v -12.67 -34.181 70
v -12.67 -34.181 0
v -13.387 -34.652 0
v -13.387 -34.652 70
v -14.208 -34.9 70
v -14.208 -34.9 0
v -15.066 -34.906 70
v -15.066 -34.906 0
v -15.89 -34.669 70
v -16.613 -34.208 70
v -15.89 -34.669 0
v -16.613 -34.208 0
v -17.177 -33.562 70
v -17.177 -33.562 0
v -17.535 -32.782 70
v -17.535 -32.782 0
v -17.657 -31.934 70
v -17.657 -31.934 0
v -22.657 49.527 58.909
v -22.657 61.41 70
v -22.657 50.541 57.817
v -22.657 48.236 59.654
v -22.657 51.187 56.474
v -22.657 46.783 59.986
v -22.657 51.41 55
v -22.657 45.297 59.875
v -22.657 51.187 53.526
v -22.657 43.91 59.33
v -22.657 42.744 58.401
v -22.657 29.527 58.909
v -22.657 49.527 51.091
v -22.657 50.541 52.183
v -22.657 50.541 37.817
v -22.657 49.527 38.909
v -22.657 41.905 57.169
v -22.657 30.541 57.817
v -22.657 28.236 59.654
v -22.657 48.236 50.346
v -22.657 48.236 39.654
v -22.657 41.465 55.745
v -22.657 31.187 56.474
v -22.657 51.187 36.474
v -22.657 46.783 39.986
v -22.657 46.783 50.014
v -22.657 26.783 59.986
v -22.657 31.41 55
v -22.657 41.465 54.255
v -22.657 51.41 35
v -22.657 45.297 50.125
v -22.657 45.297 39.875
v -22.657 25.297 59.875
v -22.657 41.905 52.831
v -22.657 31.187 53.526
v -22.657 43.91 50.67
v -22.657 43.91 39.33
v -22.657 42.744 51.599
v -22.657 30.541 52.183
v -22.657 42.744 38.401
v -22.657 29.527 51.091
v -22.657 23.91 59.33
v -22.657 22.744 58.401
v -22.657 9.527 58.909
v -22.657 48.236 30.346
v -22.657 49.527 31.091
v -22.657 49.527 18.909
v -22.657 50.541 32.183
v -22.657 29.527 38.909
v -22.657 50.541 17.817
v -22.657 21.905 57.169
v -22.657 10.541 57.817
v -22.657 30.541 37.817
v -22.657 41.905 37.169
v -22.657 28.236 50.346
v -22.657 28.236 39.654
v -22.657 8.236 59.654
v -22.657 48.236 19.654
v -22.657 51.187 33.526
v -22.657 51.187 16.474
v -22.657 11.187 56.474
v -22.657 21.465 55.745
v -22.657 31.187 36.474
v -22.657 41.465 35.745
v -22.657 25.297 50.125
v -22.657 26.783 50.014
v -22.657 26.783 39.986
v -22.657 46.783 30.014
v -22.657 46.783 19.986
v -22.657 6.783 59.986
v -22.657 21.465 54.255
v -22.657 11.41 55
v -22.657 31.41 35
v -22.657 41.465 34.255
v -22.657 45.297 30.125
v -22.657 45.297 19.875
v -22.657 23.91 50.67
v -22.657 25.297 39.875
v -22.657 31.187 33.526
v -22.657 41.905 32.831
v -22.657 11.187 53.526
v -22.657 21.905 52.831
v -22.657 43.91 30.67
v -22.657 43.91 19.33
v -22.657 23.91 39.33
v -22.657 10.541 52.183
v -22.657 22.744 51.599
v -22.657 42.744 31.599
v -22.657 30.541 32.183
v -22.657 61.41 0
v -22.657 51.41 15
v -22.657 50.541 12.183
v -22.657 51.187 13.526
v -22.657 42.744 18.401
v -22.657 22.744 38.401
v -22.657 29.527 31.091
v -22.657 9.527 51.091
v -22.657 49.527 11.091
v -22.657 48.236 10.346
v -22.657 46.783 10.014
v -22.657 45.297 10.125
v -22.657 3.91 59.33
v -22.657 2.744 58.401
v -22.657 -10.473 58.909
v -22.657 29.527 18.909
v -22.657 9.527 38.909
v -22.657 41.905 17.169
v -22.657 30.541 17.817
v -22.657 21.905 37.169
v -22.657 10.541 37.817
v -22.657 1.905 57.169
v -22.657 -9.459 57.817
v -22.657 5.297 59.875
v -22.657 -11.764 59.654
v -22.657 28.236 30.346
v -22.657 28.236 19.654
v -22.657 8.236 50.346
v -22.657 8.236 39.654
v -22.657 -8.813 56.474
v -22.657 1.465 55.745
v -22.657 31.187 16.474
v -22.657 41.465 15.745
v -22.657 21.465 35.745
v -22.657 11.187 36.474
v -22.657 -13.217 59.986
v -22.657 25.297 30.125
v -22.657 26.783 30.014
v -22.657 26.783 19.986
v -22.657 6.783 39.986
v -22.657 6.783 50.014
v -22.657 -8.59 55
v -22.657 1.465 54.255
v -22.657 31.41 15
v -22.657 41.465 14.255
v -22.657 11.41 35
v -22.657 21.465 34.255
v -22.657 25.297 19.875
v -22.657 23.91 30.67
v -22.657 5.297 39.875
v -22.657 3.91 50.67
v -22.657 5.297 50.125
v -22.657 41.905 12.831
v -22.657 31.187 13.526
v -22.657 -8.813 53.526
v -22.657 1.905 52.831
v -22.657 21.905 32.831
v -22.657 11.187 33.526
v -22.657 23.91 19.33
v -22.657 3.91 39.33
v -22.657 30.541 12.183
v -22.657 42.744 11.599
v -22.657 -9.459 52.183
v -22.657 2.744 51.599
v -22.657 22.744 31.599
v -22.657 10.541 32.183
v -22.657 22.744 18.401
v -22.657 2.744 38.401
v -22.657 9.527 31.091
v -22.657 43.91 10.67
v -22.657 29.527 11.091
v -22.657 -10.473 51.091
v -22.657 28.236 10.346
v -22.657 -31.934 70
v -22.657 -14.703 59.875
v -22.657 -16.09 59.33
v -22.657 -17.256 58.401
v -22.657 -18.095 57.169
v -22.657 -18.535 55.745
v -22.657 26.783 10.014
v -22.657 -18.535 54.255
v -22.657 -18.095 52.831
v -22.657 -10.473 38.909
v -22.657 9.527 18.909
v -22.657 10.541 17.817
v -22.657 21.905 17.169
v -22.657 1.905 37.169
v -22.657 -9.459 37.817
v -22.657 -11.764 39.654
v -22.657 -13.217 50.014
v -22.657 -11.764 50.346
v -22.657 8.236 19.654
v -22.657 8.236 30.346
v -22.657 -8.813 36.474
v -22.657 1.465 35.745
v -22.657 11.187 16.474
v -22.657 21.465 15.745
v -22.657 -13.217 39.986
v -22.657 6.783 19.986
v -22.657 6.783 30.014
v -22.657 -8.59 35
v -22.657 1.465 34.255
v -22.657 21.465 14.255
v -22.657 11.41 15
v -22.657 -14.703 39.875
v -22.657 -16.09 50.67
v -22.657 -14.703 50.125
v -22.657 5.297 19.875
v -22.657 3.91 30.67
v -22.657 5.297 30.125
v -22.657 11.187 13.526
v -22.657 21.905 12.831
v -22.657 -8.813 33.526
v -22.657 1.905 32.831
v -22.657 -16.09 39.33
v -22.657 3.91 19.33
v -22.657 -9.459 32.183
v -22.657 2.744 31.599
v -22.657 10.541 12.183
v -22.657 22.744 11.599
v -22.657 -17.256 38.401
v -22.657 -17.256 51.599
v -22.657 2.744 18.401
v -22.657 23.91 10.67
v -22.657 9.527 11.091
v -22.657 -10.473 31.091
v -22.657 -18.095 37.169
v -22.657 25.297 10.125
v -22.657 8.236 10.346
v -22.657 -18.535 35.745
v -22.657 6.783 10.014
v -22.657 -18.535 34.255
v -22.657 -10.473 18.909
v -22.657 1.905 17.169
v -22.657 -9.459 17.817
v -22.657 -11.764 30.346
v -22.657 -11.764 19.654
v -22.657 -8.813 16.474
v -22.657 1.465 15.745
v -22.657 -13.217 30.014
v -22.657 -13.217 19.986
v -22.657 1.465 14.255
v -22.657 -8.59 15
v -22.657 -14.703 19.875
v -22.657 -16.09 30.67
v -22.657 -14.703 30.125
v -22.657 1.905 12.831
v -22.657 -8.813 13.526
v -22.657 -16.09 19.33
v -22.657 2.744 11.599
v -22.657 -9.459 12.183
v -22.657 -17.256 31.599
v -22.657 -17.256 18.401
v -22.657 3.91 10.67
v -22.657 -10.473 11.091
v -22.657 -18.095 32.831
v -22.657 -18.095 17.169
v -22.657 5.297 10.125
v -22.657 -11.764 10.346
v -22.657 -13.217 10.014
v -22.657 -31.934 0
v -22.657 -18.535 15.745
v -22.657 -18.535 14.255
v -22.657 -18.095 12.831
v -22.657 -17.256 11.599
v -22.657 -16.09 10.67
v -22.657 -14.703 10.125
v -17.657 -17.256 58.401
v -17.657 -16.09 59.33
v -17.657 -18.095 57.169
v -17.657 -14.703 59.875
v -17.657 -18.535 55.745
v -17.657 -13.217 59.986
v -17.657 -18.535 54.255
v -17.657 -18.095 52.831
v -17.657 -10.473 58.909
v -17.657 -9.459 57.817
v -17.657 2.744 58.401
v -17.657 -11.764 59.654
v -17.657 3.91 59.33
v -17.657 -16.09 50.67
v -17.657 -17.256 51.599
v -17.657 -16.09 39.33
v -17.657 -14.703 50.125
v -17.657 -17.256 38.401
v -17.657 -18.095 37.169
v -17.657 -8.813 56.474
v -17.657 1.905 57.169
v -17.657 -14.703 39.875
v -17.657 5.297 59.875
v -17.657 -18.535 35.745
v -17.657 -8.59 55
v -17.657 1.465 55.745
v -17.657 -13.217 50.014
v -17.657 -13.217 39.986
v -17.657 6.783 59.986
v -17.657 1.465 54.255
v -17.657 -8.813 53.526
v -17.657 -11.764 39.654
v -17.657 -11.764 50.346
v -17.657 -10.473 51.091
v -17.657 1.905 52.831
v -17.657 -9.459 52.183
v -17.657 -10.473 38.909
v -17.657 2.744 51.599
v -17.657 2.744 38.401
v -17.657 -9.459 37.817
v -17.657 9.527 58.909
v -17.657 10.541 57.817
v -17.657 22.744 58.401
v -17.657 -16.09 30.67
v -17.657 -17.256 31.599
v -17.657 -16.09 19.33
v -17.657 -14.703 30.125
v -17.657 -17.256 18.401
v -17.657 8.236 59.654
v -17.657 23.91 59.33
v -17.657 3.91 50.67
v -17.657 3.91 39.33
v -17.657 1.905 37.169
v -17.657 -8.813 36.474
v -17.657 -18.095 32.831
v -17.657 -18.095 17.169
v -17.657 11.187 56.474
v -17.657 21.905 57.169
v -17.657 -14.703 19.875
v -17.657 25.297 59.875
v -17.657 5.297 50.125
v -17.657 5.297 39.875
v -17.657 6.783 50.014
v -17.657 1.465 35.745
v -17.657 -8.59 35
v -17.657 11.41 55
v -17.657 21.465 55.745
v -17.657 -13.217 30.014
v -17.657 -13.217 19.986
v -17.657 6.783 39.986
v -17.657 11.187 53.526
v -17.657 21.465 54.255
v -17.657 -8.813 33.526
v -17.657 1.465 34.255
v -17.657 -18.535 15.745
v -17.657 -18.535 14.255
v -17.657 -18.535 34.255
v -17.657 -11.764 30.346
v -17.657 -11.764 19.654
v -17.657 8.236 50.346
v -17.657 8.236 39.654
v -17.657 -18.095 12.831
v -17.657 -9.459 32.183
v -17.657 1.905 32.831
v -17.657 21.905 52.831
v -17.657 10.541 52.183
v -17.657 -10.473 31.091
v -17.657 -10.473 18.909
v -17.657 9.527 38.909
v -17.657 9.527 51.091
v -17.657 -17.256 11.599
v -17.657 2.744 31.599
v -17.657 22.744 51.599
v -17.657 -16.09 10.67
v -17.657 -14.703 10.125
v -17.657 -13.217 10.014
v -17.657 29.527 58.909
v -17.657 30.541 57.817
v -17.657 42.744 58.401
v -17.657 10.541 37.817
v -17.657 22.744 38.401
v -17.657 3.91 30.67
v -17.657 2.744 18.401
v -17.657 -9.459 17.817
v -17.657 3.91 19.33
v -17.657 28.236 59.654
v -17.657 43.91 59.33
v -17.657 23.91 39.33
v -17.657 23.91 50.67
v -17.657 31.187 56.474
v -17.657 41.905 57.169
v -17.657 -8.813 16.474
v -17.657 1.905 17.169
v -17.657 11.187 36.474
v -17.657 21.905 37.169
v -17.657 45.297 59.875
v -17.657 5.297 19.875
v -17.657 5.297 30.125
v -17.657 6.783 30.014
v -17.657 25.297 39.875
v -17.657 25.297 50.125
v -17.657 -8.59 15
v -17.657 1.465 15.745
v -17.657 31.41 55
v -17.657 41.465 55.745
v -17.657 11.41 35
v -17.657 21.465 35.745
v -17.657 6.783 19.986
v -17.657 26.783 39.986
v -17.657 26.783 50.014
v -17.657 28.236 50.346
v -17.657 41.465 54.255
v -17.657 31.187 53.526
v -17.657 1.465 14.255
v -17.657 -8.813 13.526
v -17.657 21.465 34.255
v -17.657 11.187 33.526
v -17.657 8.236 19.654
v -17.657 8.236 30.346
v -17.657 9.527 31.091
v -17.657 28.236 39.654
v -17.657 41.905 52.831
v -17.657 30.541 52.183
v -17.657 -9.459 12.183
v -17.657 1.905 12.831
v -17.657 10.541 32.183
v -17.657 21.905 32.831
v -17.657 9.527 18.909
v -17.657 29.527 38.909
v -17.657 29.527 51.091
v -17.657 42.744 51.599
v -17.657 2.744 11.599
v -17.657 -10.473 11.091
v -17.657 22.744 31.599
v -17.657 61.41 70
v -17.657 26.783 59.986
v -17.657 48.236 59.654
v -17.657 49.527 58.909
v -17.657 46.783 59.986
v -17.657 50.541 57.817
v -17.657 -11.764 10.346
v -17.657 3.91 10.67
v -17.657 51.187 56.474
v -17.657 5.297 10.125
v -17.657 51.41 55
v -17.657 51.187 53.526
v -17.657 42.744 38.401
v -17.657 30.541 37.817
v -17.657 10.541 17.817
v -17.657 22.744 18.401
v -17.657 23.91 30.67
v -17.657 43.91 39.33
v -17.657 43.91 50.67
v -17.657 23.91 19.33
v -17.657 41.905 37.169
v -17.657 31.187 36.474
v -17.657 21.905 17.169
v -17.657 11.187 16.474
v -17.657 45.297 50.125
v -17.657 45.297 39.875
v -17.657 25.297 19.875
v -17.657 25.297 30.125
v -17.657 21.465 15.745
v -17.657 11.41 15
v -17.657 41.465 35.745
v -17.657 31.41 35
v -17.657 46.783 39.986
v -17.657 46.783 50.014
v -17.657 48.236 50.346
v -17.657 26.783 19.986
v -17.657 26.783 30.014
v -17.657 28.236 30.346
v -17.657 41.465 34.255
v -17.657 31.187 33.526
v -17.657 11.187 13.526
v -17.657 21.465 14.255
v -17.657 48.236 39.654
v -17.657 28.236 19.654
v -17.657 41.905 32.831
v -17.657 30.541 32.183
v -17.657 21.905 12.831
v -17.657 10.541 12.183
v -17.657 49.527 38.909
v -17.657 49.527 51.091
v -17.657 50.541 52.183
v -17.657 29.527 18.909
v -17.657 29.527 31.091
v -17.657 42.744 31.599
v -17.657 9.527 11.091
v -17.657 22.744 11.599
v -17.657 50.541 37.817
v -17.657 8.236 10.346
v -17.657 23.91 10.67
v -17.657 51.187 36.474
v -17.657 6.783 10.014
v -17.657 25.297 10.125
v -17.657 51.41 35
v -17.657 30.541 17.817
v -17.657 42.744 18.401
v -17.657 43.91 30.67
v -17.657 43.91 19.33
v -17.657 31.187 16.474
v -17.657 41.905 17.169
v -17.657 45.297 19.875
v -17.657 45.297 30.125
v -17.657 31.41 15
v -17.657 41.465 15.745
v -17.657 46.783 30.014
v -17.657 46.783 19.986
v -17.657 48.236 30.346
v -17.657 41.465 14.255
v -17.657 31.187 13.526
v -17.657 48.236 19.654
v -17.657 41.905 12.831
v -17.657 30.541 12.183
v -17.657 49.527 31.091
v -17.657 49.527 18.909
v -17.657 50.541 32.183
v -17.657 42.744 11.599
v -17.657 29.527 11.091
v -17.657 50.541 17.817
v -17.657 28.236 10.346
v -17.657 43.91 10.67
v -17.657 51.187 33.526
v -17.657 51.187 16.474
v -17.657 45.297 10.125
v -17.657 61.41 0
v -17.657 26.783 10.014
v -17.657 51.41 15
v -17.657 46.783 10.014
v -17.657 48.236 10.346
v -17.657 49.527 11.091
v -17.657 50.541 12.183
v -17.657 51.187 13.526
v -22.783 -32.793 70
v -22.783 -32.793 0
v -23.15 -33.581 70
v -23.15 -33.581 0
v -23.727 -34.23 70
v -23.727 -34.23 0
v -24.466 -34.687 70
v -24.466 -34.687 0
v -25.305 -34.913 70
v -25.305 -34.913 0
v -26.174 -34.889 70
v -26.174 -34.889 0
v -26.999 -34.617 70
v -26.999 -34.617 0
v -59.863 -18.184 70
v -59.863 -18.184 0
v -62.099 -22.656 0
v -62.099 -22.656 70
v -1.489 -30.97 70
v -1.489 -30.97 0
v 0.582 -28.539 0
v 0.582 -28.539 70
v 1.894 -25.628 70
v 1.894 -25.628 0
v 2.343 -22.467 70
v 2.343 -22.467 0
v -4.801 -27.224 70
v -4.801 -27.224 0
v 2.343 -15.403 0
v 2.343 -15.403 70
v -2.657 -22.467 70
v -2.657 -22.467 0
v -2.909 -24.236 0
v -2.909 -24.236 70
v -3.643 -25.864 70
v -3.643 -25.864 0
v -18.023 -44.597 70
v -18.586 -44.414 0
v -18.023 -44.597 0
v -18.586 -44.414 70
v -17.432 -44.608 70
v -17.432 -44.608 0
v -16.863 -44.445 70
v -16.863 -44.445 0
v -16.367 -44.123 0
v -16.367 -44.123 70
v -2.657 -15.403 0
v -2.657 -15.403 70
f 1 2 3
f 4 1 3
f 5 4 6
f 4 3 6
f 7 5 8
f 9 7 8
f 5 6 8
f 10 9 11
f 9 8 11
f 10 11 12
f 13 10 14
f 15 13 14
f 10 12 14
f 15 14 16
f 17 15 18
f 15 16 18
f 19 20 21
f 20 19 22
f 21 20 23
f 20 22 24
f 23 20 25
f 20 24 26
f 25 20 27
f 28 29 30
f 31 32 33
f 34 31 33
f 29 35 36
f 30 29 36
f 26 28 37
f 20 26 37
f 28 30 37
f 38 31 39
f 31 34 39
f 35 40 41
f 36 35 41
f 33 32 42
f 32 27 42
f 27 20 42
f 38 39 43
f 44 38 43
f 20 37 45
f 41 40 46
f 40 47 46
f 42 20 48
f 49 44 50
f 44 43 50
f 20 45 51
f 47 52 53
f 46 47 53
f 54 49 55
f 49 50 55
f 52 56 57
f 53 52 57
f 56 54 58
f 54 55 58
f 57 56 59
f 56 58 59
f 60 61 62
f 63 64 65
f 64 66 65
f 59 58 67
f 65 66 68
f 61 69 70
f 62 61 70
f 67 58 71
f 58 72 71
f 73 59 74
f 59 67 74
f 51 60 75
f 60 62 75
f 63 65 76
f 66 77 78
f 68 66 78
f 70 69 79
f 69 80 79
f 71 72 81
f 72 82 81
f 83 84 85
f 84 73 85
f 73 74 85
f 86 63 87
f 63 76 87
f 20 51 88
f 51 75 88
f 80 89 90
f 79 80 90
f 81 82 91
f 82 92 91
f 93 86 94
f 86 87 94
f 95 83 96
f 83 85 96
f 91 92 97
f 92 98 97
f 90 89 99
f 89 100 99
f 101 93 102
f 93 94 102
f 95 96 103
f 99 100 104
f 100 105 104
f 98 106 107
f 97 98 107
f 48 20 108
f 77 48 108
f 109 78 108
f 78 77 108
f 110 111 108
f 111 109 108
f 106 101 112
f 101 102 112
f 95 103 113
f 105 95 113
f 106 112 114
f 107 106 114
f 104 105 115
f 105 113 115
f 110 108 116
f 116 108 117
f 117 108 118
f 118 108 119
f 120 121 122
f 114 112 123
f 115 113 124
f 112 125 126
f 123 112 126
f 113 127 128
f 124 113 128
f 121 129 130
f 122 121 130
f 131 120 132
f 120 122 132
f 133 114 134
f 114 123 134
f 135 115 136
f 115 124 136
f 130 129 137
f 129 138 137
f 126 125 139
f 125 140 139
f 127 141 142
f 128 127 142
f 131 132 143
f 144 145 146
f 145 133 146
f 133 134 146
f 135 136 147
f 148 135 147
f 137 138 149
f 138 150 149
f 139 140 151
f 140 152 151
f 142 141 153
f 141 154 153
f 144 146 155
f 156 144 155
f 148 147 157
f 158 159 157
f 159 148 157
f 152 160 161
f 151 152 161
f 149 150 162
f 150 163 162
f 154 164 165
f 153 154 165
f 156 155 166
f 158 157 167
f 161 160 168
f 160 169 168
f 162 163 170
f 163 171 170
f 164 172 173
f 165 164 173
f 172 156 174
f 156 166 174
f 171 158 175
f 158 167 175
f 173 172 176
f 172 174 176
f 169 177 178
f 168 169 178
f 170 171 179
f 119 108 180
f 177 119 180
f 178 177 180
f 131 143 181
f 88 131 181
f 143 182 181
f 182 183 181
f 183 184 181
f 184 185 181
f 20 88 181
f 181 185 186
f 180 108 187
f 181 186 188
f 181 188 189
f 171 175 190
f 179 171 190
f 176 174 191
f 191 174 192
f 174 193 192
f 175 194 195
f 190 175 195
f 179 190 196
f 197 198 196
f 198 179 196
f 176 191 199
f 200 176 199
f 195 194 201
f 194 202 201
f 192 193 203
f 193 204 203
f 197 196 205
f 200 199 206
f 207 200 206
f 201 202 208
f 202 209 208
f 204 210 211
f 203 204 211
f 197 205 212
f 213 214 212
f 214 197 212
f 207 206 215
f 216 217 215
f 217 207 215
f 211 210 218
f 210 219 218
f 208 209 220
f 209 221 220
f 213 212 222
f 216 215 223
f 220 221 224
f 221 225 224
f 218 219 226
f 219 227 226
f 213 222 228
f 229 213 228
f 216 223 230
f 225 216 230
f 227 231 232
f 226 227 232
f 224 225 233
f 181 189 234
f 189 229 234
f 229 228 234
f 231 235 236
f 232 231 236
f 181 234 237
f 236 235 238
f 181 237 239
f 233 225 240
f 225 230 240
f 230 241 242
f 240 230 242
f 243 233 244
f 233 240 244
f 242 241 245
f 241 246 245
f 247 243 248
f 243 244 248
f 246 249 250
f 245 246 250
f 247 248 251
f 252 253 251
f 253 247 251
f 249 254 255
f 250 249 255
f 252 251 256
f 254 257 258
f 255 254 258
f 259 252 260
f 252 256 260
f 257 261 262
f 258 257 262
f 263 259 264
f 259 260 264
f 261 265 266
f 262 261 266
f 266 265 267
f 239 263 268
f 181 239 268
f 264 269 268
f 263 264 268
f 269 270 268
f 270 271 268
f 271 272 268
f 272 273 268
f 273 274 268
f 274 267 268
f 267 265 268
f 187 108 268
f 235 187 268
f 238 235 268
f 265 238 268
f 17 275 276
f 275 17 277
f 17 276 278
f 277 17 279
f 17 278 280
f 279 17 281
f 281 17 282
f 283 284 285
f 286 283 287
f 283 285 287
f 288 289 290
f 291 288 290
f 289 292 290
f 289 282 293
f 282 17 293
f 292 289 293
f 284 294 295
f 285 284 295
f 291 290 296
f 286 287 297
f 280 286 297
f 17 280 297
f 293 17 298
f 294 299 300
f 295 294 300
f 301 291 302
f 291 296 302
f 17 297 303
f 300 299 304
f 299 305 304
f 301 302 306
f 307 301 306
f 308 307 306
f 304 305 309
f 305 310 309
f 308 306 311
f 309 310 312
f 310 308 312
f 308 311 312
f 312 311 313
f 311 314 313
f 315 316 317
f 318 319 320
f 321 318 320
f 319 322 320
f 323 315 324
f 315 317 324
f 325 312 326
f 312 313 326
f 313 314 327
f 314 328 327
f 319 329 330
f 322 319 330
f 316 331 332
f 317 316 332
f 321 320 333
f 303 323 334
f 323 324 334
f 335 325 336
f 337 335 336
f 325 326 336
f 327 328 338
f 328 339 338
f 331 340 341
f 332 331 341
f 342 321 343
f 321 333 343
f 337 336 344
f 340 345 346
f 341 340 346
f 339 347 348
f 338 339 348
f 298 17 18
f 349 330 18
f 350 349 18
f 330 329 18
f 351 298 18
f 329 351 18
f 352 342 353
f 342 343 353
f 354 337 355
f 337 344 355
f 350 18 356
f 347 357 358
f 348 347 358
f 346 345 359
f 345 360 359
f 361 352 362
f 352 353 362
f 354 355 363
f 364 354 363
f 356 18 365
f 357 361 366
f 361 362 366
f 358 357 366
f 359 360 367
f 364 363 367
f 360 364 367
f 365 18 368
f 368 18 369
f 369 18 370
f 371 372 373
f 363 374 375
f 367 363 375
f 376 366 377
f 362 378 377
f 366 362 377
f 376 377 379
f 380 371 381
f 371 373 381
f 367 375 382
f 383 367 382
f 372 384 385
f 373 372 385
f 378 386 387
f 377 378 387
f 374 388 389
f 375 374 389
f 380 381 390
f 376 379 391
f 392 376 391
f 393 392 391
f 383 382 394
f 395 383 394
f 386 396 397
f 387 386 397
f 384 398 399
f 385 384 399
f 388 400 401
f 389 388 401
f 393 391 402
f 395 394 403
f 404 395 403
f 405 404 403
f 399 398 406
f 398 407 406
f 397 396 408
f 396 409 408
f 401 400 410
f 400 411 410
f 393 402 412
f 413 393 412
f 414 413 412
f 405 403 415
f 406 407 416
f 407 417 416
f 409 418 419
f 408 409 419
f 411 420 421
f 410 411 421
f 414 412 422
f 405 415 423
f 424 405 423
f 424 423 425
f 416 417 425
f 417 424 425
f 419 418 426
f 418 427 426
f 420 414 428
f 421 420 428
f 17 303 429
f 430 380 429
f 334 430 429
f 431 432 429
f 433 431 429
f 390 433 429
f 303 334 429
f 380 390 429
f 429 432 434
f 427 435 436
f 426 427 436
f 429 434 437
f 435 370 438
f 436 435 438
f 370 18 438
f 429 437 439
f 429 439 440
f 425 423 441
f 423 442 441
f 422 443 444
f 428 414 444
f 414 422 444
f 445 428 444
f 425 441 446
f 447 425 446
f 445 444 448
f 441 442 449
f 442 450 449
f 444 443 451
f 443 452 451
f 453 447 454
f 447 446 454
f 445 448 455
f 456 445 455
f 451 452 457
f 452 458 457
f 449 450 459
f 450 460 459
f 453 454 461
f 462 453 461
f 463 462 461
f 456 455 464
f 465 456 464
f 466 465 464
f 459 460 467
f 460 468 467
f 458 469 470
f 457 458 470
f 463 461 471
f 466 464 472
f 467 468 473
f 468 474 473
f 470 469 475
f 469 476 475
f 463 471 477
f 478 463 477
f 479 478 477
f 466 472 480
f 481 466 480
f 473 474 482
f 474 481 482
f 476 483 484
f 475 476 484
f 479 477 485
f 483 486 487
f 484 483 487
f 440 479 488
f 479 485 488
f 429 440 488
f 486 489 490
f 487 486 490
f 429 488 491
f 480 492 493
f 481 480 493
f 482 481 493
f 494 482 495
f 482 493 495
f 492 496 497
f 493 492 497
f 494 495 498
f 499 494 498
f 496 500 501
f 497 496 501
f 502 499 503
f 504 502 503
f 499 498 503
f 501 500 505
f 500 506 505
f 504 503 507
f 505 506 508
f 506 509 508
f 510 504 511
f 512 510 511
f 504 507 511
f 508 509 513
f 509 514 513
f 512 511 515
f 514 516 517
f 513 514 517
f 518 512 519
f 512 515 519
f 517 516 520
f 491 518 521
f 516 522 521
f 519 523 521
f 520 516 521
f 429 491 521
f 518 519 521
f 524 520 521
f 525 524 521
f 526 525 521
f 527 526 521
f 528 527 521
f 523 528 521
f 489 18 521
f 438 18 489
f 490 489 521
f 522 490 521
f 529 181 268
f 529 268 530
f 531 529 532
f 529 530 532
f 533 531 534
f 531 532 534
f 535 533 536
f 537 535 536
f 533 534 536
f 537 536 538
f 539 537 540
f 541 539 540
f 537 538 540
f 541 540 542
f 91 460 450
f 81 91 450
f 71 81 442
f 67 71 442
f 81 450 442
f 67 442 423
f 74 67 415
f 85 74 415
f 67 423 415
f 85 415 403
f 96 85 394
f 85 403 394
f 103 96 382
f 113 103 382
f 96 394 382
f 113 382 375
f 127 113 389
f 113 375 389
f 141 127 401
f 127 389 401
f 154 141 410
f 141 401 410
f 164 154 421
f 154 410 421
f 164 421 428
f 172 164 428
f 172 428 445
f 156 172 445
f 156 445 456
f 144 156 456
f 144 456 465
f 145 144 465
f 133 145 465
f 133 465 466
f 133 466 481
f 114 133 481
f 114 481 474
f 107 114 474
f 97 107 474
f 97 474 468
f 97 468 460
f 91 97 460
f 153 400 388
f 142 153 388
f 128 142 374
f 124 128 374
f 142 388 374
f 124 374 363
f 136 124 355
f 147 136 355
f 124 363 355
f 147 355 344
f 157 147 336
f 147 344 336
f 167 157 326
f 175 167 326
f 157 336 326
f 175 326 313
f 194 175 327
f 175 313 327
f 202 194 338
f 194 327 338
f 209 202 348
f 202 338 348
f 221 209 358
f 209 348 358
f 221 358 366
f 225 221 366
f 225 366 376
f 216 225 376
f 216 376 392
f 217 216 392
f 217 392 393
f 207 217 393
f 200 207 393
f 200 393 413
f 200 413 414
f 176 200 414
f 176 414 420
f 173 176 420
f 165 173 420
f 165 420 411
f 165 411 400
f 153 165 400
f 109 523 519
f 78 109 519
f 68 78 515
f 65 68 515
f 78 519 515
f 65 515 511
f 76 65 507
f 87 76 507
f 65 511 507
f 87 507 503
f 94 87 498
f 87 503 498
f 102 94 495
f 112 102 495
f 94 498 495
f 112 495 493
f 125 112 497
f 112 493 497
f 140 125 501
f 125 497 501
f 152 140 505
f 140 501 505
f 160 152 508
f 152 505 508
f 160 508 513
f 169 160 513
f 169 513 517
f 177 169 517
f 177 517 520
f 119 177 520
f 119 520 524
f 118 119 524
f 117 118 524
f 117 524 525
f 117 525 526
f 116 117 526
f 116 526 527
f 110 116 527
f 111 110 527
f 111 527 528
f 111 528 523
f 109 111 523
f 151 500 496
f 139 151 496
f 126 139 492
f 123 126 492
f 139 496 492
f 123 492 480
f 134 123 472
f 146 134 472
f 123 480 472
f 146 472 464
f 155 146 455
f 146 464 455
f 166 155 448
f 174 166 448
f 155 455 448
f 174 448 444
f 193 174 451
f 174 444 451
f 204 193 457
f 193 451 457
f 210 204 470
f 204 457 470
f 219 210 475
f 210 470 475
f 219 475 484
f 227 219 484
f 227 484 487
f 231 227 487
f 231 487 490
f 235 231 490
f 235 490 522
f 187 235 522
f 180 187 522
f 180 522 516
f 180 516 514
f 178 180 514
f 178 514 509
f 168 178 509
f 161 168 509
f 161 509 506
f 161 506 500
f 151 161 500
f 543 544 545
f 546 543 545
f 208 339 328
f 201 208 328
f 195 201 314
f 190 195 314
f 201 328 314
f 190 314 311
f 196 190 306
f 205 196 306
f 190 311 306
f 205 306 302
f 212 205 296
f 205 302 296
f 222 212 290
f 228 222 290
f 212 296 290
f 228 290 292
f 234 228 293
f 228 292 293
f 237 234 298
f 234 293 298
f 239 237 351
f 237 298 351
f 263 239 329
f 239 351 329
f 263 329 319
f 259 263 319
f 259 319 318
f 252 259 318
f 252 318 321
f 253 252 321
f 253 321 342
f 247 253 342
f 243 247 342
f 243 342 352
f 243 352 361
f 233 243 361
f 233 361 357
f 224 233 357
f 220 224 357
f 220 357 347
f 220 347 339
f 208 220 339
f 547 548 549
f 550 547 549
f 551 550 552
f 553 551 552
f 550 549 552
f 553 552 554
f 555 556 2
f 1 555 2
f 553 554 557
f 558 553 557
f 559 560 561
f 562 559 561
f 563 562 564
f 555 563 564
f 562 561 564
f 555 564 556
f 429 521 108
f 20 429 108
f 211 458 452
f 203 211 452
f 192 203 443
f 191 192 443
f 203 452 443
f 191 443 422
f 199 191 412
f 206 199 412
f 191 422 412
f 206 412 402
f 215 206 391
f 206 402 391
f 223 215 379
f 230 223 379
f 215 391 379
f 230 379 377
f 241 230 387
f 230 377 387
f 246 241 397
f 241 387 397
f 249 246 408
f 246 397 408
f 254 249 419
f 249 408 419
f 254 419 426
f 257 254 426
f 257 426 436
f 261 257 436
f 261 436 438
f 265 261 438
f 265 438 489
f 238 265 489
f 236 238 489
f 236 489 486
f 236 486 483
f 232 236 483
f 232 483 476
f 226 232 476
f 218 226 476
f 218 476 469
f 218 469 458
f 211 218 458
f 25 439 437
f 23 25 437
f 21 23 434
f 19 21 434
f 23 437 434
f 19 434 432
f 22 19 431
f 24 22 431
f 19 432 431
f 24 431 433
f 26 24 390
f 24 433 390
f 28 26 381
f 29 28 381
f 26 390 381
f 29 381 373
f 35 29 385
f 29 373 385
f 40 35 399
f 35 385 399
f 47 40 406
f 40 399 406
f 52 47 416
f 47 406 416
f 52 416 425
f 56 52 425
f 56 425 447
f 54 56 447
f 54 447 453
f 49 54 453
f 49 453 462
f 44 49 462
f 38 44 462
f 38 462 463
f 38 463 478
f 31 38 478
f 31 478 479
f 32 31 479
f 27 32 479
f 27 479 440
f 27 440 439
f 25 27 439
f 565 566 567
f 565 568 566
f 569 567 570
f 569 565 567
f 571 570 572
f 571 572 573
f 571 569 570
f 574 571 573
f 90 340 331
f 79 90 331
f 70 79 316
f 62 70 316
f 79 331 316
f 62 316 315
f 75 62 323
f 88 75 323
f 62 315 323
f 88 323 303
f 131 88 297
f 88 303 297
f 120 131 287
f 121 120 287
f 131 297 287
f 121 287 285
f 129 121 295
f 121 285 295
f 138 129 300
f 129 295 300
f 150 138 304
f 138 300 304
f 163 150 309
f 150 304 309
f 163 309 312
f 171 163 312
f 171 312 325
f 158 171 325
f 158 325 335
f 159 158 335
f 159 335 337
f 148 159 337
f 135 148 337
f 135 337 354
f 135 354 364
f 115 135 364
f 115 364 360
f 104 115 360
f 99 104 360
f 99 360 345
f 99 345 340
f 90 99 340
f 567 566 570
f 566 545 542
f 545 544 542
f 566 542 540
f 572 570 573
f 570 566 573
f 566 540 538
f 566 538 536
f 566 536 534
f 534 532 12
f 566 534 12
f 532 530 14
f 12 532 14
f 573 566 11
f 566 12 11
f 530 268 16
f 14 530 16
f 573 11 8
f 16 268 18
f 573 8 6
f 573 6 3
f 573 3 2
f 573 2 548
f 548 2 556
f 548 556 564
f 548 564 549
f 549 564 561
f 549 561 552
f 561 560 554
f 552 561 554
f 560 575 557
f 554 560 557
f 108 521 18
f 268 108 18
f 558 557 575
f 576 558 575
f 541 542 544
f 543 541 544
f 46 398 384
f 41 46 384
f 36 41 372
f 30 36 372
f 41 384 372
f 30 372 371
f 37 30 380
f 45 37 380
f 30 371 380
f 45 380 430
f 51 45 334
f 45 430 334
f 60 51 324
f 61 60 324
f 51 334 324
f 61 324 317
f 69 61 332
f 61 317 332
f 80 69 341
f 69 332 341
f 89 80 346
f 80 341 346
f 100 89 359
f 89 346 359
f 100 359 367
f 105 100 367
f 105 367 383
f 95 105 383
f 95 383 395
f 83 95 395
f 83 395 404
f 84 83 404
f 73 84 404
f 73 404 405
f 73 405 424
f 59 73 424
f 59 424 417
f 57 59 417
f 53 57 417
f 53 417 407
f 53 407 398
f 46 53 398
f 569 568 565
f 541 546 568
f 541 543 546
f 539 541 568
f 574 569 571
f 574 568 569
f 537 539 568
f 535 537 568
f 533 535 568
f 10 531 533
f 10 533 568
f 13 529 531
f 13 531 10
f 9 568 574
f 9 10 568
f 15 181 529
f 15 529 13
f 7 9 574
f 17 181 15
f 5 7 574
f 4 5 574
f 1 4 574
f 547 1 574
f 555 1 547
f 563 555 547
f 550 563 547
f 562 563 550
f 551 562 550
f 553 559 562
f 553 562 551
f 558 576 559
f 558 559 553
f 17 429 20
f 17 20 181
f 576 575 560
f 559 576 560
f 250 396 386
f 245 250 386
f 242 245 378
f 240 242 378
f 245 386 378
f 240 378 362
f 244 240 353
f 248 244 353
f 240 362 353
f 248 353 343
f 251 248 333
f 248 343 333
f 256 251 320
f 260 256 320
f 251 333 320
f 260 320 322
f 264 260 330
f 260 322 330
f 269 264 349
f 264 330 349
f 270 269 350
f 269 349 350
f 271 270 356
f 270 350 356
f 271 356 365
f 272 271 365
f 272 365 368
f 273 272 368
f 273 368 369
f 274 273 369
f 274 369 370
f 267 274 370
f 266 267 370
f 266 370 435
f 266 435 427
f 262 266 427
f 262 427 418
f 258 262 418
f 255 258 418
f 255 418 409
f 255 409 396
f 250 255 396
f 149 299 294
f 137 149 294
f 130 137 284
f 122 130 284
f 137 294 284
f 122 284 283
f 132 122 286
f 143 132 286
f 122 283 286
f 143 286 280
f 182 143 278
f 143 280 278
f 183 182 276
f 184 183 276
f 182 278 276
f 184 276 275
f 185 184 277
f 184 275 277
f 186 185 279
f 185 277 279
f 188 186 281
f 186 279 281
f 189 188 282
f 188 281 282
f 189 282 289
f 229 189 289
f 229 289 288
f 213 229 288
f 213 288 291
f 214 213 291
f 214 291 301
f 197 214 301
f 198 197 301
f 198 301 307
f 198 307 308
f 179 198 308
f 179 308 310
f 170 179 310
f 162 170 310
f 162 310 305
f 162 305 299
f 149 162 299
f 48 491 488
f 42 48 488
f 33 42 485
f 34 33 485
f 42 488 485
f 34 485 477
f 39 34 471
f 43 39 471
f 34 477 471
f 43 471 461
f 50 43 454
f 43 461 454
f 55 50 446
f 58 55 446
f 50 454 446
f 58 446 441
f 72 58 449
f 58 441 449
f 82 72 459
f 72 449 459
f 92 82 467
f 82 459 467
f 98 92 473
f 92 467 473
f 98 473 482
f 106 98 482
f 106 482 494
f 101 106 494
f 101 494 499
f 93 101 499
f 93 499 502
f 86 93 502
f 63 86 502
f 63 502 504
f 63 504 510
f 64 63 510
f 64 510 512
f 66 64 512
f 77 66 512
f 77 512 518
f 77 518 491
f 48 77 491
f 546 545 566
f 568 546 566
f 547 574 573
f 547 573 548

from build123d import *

# Parameters (mm, degrees)
F1_DEPTH = 70
F2_R     = 5
F3_DEPTH = 25
F4_R     = 2


with BuildPart() as f1:
    # F0 (on Top) → F1 (new body)
    with BuildSketch(Plane.XY):
        with BuildLine():
            Line((-17.657248, -31.933628), (-17.657248, 61.409633))
            Line((-17.657248, 61.409633), (-22.657248, 61.409633))
            Line((-22.657248, 61.409633), (-22.657248, -31.933628))
            ThreePointArc((-22.657248, -31.933628), (-24.080087, -34.4856), (-26.998956, -34.616876))
            Line((-26.998956, -34.616876), (-59.862951, -18.183851))
            Line((-59.862951, -18.183851), (-62.09913, -22.655931))
            Line((-62.09913, -22.655931), (-17.37833, -45.017729))
            Line((-17.37833, -45.017729), (-1.489394, -30.969989))
            ThreePointArc((-1.489394, -30.969989), (1.340461, -27.130205), (2.342752, -22.466792))
            Line((2.342752, -22.466792), (2.342752, -15.403016))
            Line((2.342752, -15.403016), (-2.657248, -15.403016))
            Line((-2.657248, -15.403016), (-2.657248, -22.466792))
            ThreePointArc((-2.657248, -22.466792), (-3.218001, -25.075838), (-4.801224, -27.224087))
            Line((-4.801224, -27.224087), (-12.67015, -34.181169))
            ThreePointArc((-12.67015, -34.181169), (-15.889868, -34.668705), (-17.657248, -31.933628))
        make_face()
    extrude(amount=F1_DEPTH)

    # F2 (on face) → F3 (cut)
    with BuildSketch(Plane.YZ.offset(-17.657248)):
        with Locations((46.409633, 55)):
            Circle(F2_R)
        with Locations((46.409633, 35)):
            Circle(F2_R)
        with Locations((46.409633, 15)):
            Circle(F2_R)
        with Locations((26.409633, 55)):
            Circle(F2_R)
        with Locations((26.409633, 35)):
            Circle(F2_R)
        with Locations((26.409633, 15)):
            Circle(F2_R)
        with Locations((6.409633, 55)):
            Circle(F2_R)
        with Locations((6.409633, 35)):
            Circle(F2_R)
        with Locations((6.409633, 15)):
            Circle(F2_R)
        with Locations((-13.590367, 55)):
            Circle(F2_R)
        with Locations((-13.590367, 35)):
            Circle(F2_R)
        with Locations((-13.590367, 15)):
            Circle(F2_R)
    extrude(amount=-F3_DEPTH, mode=Mode.SUBTRACT)

    # F4
    f4_edges = [f1.edges().sort_by_distance(p)[0] for p in [
        (-17.37833, -45.017729, 35),
    ]]
    fillet(f4_edges, radius=F4_R)


solid = f1.part
